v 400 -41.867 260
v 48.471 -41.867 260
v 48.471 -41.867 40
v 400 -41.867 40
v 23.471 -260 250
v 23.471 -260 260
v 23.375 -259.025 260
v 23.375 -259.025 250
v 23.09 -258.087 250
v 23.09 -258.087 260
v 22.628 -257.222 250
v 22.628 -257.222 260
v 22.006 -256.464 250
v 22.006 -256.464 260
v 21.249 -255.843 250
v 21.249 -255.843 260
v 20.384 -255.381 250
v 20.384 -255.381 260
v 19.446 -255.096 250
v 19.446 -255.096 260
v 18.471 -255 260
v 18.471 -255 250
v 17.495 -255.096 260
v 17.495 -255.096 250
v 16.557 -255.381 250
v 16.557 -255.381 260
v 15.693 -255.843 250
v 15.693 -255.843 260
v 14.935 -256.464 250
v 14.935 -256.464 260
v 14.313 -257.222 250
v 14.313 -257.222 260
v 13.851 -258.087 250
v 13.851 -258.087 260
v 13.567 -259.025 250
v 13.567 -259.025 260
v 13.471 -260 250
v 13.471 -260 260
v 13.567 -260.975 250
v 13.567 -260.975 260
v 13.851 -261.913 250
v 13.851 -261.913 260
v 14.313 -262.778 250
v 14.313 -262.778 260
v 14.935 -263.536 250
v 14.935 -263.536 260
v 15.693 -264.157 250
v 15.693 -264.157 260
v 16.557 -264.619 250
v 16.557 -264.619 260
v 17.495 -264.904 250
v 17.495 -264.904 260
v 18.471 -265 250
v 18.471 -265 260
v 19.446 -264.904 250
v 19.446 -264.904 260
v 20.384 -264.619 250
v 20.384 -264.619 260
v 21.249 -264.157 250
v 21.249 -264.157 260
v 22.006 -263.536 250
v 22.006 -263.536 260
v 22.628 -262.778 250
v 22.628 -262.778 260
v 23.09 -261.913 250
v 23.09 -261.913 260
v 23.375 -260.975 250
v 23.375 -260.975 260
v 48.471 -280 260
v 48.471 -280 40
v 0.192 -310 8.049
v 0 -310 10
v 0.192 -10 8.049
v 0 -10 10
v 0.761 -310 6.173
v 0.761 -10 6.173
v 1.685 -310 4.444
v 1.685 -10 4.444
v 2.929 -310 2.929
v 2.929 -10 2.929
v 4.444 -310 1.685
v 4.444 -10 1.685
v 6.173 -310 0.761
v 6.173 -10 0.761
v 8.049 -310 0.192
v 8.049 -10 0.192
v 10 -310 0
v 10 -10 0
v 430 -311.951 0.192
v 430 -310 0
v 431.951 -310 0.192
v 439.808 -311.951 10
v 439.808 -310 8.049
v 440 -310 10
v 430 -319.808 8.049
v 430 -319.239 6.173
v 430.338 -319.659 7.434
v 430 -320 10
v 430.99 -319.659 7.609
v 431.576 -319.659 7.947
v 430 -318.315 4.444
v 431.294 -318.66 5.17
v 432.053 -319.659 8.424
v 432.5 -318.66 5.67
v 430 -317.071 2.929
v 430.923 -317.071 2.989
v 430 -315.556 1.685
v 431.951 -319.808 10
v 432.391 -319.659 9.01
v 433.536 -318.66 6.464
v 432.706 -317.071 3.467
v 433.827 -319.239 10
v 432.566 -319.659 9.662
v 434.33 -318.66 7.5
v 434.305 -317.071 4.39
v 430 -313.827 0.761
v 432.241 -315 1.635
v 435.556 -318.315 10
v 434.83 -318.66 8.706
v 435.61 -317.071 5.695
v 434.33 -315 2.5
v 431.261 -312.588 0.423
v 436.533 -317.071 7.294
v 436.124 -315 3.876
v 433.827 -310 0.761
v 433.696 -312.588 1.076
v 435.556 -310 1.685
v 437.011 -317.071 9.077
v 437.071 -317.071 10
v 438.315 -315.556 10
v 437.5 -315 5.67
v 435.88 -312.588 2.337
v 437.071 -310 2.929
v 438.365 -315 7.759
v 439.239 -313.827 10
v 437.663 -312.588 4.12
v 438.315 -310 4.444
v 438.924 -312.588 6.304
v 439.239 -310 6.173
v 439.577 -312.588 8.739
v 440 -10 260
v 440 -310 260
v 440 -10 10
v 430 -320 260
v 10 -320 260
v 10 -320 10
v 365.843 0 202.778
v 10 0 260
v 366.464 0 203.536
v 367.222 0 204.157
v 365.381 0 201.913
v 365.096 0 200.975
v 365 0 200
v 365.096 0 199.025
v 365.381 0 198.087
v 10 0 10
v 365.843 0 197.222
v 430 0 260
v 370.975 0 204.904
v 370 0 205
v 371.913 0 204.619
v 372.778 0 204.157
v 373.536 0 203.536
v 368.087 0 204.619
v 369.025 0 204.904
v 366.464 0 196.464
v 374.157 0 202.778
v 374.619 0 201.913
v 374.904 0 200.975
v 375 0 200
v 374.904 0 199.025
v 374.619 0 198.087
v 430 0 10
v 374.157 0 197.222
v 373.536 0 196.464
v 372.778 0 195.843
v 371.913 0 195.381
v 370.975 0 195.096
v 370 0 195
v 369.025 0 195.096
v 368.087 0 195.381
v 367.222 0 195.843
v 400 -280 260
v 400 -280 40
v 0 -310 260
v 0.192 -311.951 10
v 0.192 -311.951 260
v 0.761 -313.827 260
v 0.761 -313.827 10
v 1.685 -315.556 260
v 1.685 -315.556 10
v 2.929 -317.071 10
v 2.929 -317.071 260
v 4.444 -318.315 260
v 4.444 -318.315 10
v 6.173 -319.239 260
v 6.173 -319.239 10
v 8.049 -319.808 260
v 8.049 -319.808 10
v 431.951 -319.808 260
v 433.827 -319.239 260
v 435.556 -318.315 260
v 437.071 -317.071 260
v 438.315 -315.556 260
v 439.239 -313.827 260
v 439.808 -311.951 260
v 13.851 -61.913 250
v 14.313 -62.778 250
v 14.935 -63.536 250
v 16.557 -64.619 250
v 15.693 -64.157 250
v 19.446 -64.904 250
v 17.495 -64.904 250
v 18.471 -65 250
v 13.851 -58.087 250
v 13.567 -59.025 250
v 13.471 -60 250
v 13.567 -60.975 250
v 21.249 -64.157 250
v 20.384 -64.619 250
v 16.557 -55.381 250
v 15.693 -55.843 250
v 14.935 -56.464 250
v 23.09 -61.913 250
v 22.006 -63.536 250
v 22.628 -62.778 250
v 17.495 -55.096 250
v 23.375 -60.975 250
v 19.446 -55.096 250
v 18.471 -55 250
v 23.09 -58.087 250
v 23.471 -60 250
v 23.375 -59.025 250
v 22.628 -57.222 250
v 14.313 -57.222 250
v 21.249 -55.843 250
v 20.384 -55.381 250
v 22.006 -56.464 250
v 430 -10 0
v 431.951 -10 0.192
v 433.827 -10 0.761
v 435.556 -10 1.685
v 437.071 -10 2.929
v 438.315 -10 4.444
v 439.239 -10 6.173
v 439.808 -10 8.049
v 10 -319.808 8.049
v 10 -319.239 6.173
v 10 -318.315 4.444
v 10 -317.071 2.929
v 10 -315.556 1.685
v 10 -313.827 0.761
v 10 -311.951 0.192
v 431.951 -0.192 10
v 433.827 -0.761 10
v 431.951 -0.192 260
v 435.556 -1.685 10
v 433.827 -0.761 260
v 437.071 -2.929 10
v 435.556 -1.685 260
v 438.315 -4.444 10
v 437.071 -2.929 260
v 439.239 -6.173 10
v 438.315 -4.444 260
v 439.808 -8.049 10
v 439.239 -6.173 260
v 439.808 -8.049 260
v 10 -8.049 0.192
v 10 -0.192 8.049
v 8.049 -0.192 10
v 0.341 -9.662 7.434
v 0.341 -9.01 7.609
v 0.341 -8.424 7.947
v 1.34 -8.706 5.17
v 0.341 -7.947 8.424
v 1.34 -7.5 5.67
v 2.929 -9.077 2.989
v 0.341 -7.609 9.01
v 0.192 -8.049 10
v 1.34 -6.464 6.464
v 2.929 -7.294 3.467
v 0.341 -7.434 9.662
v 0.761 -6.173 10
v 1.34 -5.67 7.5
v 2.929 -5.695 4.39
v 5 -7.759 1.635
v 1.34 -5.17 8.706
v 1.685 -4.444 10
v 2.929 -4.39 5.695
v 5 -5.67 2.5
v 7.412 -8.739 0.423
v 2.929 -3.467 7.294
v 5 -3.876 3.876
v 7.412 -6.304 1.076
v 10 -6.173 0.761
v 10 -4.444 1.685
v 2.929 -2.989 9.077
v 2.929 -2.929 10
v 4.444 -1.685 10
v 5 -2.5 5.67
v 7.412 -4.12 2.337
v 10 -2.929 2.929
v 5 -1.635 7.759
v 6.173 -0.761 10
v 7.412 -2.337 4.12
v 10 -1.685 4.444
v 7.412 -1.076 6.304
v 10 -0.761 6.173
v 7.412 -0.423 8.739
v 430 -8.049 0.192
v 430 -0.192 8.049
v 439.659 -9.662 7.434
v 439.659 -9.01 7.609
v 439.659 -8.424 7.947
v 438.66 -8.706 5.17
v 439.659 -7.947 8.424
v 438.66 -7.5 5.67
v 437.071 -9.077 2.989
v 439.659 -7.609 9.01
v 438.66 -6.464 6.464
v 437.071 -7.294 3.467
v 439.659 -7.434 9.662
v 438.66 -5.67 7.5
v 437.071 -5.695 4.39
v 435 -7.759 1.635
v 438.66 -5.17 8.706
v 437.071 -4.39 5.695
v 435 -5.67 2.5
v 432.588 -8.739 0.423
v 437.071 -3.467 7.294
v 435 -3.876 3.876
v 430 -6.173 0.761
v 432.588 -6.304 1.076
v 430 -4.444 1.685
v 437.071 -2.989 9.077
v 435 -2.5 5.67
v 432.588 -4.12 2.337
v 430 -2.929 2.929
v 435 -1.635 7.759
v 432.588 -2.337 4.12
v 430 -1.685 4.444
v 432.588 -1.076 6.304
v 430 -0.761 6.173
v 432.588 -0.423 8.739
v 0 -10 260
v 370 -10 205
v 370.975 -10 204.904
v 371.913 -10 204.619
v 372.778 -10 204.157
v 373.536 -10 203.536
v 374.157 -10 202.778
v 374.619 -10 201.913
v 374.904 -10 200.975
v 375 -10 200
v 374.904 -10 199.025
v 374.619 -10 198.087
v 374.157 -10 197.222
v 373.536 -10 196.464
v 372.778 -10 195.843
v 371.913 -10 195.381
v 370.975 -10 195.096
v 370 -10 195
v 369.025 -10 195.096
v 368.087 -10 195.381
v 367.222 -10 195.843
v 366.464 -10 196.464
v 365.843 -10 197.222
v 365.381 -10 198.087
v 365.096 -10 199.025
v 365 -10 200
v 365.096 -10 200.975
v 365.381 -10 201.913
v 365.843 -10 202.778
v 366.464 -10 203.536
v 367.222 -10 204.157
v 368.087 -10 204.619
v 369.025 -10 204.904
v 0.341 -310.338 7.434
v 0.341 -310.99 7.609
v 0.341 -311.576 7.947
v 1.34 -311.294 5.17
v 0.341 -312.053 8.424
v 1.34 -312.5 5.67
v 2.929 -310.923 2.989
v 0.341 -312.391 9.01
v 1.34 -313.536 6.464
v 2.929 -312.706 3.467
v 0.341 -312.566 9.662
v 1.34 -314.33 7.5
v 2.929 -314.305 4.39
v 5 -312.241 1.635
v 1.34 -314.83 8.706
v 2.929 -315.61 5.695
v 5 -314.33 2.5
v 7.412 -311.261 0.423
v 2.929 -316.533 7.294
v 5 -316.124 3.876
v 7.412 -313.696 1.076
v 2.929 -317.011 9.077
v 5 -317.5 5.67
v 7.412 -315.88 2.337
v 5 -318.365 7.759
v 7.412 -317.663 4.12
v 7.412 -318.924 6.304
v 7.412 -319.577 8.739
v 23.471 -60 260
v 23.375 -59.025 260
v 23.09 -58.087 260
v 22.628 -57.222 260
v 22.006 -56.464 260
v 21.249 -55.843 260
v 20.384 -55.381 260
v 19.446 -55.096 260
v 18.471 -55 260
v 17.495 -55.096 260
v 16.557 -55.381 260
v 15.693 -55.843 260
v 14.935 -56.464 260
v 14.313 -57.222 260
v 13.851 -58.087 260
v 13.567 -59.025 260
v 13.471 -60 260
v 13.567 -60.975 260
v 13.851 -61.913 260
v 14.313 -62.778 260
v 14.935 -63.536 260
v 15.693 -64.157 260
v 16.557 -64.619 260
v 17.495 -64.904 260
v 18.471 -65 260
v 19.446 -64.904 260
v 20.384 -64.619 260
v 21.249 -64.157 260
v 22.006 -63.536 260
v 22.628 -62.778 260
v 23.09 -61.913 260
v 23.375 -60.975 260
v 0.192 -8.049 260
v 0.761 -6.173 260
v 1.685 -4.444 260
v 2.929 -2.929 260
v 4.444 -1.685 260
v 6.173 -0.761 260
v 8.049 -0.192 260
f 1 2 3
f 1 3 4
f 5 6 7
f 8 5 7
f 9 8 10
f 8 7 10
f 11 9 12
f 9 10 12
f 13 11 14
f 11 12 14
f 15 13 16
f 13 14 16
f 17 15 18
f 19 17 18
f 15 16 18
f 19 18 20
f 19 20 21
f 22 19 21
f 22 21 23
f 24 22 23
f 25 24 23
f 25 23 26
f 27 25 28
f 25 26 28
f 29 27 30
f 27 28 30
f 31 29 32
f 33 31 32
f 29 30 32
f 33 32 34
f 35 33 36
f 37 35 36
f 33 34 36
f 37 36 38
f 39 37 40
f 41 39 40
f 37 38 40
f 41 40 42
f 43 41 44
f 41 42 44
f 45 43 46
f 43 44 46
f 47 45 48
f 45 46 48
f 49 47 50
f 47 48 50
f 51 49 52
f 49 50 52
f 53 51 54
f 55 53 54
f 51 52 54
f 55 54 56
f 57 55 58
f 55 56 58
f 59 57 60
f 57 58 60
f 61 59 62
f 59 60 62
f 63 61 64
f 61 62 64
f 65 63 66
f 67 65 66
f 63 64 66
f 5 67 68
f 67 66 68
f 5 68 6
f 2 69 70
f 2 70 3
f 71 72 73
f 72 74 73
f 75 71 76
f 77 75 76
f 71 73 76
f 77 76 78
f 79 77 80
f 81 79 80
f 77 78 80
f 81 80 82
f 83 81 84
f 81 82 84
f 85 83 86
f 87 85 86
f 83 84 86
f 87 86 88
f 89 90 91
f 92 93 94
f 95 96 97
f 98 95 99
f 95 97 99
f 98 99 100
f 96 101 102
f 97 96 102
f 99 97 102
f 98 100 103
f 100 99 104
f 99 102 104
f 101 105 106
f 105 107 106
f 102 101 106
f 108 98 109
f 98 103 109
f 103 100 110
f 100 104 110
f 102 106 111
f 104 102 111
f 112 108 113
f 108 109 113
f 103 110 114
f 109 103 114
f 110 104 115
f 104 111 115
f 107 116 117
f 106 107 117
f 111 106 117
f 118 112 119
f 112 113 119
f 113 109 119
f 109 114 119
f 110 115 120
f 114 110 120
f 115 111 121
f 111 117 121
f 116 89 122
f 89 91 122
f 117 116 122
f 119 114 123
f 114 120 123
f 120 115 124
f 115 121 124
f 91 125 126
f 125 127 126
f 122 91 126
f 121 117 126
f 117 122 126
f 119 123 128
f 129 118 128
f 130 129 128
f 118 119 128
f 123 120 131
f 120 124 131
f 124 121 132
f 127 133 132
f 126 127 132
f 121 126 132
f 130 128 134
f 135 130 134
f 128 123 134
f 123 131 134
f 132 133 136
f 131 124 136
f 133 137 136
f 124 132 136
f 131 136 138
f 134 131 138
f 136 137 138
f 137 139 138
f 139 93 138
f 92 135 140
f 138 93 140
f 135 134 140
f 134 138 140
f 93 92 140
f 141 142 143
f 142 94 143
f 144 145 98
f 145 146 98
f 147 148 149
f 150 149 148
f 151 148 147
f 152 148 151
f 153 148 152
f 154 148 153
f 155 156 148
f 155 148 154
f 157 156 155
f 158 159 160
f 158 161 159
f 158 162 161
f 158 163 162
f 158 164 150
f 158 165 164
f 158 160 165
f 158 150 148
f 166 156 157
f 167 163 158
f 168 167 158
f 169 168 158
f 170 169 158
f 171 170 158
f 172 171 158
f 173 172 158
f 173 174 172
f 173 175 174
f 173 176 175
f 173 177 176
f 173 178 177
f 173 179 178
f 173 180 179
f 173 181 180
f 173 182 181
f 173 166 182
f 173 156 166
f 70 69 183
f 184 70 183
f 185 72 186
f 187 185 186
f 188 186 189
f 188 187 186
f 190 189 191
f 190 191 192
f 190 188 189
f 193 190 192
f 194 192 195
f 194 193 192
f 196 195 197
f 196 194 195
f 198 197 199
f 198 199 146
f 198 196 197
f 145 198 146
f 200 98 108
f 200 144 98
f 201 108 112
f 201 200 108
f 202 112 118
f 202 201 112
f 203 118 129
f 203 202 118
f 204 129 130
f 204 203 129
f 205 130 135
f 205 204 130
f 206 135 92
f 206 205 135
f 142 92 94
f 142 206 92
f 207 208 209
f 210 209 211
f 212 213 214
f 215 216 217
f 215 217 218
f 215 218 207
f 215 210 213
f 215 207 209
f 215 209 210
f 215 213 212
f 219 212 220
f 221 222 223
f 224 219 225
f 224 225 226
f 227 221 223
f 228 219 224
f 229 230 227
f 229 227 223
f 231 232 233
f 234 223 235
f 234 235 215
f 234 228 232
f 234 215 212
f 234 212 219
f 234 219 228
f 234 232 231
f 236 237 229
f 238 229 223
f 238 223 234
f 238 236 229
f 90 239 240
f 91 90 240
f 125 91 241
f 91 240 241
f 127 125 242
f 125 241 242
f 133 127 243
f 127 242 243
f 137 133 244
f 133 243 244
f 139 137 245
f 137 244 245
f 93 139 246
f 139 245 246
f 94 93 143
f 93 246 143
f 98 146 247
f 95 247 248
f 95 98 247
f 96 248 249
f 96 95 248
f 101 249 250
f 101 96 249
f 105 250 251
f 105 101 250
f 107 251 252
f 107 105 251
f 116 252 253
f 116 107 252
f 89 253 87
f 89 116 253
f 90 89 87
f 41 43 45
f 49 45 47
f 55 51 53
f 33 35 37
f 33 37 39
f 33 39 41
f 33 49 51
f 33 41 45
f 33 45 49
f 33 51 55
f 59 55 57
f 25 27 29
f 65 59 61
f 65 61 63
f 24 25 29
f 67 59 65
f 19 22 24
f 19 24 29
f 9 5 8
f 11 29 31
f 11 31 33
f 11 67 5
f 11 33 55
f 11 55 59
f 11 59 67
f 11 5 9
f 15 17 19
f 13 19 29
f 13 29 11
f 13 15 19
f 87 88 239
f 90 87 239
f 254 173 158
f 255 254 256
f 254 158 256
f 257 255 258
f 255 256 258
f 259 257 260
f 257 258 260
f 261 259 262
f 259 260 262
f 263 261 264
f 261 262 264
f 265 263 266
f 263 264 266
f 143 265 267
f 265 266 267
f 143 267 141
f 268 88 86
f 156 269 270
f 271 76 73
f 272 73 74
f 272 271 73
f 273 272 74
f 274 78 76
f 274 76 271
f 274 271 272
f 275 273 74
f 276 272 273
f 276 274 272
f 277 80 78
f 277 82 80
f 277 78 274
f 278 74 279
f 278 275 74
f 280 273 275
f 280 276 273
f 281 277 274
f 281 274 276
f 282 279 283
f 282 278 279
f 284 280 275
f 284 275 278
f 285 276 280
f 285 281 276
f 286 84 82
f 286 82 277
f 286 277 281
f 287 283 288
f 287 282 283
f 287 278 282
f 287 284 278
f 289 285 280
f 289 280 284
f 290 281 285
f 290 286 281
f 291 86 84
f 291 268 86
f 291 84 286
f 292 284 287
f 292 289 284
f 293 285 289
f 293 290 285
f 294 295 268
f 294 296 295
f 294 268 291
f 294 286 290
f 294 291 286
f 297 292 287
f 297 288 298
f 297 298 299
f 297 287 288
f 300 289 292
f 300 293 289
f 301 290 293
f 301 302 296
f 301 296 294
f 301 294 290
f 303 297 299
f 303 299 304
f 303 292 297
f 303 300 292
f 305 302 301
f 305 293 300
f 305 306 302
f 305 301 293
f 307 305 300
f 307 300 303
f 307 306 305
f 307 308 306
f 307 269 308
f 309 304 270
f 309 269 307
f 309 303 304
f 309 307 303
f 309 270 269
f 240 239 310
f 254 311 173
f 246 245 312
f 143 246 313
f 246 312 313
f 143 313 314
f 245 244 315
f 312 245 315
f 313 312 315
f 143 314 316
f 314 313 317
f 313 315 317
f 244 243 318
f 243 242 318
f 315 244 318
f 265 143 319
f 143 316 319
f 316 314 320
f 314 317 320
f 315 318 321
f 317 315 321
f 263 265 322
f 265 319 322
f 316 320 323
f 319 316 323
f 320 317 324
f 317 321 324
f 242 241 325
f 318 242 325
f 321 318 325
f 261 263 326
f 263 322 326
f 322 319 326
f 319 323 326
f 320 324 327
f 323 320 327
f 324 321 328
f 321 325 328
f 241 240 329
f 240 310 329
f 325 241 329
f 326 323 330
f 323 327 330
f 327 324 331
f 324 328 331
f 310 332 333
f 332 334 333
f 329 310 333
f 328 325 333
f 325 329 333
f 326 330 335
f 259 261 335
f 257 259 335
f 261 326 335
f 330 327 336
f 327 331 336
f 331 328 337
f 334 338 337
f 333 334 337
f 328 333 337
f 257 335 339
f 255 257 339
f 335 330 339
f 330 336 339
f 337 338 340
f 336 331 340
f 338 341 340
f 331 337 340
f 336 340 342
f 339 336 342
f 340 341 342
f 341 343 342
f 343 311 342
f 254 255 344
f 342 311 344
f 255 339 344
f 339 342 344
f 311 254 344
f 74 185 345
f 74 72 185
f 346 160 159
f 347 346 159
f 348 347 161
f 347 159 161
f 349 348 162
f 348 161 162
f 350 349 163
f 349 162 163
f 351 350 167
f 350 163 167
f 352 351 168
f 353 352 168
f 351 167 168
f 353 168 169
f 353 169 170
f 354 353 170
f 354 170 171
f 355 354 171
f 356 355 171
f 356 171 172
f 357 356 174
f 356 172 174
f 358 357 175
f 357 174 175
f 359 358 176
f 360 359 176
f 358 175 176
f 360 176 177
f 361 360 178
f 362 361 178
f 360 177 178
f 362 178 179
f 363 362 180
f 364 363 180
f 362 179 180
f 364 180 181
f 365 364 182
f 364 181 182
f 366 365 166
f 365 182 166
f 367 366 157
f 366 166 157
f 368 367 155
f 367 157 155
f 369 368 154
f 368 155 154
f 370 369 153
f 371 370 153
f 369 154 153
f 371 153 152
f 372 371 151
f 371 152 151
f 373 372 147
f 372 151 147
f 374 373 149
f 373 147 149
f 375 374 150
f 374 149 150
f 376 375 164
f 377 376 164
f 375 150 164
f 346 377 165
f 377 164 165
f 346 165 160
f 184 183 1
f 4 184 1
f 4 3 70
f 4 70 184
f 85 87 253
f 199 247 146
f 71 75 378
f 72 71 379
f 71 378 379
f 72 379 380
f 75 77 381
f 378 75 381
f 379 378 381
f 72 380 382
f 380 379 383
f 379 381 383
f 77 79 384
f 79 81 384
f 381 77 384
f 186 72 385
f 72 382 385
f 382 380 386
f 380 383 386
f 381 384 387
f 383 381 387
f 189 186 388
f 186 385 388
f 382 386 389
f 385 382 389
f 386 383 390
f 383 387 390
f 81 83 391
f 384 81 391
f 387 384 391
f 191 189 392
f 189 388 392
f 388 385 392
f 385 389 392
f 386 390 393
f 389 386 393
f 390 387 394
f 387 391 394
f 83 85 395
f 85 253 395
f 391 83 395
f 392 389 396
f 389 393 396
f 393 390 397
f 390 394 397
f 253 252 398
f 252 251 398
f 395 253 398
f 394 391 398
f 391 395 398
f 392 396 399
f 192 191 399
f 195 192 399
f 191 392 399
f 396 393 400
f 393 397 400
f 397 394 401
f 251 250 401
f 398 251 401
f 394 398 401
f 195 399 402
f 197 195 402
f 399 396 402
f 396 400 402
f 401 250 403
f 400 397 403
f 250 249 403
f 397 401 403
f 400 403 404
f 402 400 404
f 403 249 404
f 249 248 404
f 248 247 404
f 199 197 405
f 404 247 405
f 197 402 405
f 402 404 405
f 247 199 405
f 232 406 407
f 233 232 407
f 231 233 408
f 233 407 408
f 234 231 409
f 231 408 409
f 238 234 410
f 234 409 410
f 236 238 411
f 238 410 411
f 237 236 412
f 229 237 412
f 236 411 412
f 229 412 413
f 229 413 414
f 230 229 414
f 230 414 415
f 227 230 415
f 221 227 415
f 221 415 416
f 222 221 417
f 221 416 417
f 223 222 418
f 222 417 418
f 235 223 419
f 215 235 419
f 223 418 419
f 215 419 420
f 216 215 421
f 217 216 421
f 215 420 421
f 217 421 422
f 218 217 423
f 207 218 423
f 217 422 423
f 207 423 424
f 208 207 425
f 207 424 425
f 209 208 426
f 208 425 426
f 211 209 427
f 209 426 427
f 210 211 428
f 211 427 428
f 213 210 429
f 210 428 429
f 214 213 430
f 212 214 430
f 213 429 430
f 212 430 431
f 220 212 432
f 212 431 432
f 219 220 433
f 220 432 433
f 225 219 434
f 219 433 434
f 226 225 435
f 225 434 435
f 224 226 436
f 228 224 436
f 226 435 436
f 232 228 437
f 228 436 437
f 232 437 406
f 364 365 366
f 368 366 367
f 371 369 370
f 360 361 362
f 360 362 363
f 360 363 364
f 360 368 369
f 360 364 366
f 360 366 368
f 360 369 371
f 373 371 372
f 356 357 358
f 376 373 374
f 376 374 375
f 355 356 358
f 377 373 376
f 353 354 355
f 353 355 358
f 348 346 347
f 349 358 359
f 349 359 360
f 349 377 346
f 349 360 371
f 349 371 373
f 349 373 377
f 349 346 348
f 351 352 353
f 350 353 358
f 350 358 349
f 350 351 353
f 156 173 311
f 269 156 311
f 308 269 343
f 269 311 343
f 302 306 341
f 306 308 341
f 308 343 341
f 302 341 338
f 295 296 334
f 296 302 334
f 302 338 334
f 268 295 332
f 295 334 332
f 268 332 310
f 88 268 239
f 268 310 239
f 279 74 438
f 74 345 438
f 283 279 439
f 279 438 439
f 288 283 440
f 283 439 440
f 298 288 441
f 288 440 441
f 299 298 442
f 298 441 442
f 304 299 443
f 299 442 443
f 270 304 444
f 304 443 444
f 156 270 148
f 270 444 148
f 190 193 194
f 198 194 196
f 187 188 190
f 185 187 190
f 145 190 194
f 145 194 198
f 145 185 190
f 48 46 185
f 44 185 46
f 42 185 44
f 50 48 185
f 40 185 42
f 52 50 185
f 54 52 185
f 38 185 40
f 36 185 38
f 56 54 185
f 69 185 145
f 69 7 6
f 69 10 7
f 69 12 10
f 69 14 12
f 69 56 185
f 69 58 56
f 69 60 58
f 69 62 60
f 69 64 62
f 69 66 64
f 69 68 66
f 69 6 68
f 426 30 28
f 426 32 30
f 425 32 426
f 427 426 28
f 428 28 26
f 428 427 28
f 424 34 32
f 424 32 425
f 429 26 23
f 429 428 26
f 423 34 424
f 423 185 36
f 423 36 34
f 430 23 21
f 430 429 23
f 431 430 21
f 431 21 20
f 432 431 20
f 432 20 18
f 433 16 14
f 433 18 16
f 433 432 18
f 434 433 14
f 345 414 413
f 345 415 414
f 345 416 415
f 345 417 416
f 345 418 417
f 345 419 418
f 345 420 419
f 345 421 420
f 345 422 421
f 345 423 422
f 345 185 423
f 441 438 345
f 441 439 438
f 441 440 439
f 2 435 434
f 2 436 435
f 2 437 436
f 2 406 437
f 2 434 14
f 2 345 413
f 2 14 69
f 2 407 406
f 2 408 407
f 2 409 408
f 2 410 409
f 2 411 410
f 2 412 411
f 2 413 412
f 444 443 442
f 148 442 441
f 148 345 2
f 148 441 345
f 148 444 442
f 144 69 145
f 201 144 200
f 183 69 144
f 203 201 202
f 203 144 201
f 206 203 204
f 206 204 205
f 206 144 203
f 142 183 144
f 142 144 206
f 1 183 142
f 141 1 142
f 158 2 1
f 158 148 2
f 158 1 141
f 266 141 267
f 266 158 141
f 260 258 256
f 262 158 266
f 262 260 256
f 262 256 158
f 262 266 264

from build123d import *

# Parameters (mm, degrees)
SKETCH_1_W          = 440
SKETCH_1_H          = 320
EXTRUDE_1_DEPTH     = 260
SKETCH_6_W          = 351.529236831
SKETCH_6_H          = 238.132708821
CUT_EXTRUDE_1_DEPTH = 220
FILLET_1_R          = 10
SKETCH_7_R          = 5
CUT_EXTRUDE_2_DEPTH = 10
SKETCH_8_R          = 5
CUT_EXTRUDE_3_DEPTH = 10


with BuildPart() as part:
    # 草图1 → 凸台-拉伸1 (new body)
    with BuildSketch(Plane.XY):
        with Locations((220, -160)):
            Rectangle(SKETCH_1_W, SKETCH_1_H)
    extrude(amount=EXTRUDE_1_DEPTH)

    # 草图6 → 切除-拉伸1 (cut)
    with BuildSketch(Plane.XY.offset(260)):
        with Locations((224.235381585, -160.93364559)):
            Rectangle(SKETCH_6_W, SKETCH_6_H)
    extrude(amount=-CUT_EXTRUDE_1_DEPTH, mode=Mode.SUBTRACT)

    # 圆角1
    fillet_1_edges = [part.edges().sort_by_distance(p)[0] for p in [
        (220, 0, 0),
        (440, -160, 0),
        (220, -320, 0),
        (0, -160, 0),
        (0, 0, 130),
        (440, 0, 130),
        (440, -320, 130),
        (0, -320, 130),
    ]]
    fillet(fillet_1_edges, radius=FILLET_1_R)

    # 草图7 → 切除-拉伸2 (cut)
    with BuildSketch(Plane.XY.offset(260)):
        with Locations((18.470763169, -60)):
            Circle(SKETCH_7_R)
        with Locations((18.470763169, -260)):
            Circle(SKETCH_7_R)
    extrude(amount=-CUT_EXTRUDE_2_DEPTH, mode=Mode.SUBTRACT)

    # 草图8 → 切除-拉伸3 (cut)
    with BuildSketch(Plane(origin=(0, 0, 0), x_dir=(1, 0, 0), z_dir=(0, 1, 0))):
        with Locations(Location((370, -200, 0), (0, 0, 270))):
            Circle(SKETCH_8_R)
    extrude(amount=-CUT_EXTRUDE_3_DEPTH, mode=Mode.SUBTRACT)


solid = part.part
